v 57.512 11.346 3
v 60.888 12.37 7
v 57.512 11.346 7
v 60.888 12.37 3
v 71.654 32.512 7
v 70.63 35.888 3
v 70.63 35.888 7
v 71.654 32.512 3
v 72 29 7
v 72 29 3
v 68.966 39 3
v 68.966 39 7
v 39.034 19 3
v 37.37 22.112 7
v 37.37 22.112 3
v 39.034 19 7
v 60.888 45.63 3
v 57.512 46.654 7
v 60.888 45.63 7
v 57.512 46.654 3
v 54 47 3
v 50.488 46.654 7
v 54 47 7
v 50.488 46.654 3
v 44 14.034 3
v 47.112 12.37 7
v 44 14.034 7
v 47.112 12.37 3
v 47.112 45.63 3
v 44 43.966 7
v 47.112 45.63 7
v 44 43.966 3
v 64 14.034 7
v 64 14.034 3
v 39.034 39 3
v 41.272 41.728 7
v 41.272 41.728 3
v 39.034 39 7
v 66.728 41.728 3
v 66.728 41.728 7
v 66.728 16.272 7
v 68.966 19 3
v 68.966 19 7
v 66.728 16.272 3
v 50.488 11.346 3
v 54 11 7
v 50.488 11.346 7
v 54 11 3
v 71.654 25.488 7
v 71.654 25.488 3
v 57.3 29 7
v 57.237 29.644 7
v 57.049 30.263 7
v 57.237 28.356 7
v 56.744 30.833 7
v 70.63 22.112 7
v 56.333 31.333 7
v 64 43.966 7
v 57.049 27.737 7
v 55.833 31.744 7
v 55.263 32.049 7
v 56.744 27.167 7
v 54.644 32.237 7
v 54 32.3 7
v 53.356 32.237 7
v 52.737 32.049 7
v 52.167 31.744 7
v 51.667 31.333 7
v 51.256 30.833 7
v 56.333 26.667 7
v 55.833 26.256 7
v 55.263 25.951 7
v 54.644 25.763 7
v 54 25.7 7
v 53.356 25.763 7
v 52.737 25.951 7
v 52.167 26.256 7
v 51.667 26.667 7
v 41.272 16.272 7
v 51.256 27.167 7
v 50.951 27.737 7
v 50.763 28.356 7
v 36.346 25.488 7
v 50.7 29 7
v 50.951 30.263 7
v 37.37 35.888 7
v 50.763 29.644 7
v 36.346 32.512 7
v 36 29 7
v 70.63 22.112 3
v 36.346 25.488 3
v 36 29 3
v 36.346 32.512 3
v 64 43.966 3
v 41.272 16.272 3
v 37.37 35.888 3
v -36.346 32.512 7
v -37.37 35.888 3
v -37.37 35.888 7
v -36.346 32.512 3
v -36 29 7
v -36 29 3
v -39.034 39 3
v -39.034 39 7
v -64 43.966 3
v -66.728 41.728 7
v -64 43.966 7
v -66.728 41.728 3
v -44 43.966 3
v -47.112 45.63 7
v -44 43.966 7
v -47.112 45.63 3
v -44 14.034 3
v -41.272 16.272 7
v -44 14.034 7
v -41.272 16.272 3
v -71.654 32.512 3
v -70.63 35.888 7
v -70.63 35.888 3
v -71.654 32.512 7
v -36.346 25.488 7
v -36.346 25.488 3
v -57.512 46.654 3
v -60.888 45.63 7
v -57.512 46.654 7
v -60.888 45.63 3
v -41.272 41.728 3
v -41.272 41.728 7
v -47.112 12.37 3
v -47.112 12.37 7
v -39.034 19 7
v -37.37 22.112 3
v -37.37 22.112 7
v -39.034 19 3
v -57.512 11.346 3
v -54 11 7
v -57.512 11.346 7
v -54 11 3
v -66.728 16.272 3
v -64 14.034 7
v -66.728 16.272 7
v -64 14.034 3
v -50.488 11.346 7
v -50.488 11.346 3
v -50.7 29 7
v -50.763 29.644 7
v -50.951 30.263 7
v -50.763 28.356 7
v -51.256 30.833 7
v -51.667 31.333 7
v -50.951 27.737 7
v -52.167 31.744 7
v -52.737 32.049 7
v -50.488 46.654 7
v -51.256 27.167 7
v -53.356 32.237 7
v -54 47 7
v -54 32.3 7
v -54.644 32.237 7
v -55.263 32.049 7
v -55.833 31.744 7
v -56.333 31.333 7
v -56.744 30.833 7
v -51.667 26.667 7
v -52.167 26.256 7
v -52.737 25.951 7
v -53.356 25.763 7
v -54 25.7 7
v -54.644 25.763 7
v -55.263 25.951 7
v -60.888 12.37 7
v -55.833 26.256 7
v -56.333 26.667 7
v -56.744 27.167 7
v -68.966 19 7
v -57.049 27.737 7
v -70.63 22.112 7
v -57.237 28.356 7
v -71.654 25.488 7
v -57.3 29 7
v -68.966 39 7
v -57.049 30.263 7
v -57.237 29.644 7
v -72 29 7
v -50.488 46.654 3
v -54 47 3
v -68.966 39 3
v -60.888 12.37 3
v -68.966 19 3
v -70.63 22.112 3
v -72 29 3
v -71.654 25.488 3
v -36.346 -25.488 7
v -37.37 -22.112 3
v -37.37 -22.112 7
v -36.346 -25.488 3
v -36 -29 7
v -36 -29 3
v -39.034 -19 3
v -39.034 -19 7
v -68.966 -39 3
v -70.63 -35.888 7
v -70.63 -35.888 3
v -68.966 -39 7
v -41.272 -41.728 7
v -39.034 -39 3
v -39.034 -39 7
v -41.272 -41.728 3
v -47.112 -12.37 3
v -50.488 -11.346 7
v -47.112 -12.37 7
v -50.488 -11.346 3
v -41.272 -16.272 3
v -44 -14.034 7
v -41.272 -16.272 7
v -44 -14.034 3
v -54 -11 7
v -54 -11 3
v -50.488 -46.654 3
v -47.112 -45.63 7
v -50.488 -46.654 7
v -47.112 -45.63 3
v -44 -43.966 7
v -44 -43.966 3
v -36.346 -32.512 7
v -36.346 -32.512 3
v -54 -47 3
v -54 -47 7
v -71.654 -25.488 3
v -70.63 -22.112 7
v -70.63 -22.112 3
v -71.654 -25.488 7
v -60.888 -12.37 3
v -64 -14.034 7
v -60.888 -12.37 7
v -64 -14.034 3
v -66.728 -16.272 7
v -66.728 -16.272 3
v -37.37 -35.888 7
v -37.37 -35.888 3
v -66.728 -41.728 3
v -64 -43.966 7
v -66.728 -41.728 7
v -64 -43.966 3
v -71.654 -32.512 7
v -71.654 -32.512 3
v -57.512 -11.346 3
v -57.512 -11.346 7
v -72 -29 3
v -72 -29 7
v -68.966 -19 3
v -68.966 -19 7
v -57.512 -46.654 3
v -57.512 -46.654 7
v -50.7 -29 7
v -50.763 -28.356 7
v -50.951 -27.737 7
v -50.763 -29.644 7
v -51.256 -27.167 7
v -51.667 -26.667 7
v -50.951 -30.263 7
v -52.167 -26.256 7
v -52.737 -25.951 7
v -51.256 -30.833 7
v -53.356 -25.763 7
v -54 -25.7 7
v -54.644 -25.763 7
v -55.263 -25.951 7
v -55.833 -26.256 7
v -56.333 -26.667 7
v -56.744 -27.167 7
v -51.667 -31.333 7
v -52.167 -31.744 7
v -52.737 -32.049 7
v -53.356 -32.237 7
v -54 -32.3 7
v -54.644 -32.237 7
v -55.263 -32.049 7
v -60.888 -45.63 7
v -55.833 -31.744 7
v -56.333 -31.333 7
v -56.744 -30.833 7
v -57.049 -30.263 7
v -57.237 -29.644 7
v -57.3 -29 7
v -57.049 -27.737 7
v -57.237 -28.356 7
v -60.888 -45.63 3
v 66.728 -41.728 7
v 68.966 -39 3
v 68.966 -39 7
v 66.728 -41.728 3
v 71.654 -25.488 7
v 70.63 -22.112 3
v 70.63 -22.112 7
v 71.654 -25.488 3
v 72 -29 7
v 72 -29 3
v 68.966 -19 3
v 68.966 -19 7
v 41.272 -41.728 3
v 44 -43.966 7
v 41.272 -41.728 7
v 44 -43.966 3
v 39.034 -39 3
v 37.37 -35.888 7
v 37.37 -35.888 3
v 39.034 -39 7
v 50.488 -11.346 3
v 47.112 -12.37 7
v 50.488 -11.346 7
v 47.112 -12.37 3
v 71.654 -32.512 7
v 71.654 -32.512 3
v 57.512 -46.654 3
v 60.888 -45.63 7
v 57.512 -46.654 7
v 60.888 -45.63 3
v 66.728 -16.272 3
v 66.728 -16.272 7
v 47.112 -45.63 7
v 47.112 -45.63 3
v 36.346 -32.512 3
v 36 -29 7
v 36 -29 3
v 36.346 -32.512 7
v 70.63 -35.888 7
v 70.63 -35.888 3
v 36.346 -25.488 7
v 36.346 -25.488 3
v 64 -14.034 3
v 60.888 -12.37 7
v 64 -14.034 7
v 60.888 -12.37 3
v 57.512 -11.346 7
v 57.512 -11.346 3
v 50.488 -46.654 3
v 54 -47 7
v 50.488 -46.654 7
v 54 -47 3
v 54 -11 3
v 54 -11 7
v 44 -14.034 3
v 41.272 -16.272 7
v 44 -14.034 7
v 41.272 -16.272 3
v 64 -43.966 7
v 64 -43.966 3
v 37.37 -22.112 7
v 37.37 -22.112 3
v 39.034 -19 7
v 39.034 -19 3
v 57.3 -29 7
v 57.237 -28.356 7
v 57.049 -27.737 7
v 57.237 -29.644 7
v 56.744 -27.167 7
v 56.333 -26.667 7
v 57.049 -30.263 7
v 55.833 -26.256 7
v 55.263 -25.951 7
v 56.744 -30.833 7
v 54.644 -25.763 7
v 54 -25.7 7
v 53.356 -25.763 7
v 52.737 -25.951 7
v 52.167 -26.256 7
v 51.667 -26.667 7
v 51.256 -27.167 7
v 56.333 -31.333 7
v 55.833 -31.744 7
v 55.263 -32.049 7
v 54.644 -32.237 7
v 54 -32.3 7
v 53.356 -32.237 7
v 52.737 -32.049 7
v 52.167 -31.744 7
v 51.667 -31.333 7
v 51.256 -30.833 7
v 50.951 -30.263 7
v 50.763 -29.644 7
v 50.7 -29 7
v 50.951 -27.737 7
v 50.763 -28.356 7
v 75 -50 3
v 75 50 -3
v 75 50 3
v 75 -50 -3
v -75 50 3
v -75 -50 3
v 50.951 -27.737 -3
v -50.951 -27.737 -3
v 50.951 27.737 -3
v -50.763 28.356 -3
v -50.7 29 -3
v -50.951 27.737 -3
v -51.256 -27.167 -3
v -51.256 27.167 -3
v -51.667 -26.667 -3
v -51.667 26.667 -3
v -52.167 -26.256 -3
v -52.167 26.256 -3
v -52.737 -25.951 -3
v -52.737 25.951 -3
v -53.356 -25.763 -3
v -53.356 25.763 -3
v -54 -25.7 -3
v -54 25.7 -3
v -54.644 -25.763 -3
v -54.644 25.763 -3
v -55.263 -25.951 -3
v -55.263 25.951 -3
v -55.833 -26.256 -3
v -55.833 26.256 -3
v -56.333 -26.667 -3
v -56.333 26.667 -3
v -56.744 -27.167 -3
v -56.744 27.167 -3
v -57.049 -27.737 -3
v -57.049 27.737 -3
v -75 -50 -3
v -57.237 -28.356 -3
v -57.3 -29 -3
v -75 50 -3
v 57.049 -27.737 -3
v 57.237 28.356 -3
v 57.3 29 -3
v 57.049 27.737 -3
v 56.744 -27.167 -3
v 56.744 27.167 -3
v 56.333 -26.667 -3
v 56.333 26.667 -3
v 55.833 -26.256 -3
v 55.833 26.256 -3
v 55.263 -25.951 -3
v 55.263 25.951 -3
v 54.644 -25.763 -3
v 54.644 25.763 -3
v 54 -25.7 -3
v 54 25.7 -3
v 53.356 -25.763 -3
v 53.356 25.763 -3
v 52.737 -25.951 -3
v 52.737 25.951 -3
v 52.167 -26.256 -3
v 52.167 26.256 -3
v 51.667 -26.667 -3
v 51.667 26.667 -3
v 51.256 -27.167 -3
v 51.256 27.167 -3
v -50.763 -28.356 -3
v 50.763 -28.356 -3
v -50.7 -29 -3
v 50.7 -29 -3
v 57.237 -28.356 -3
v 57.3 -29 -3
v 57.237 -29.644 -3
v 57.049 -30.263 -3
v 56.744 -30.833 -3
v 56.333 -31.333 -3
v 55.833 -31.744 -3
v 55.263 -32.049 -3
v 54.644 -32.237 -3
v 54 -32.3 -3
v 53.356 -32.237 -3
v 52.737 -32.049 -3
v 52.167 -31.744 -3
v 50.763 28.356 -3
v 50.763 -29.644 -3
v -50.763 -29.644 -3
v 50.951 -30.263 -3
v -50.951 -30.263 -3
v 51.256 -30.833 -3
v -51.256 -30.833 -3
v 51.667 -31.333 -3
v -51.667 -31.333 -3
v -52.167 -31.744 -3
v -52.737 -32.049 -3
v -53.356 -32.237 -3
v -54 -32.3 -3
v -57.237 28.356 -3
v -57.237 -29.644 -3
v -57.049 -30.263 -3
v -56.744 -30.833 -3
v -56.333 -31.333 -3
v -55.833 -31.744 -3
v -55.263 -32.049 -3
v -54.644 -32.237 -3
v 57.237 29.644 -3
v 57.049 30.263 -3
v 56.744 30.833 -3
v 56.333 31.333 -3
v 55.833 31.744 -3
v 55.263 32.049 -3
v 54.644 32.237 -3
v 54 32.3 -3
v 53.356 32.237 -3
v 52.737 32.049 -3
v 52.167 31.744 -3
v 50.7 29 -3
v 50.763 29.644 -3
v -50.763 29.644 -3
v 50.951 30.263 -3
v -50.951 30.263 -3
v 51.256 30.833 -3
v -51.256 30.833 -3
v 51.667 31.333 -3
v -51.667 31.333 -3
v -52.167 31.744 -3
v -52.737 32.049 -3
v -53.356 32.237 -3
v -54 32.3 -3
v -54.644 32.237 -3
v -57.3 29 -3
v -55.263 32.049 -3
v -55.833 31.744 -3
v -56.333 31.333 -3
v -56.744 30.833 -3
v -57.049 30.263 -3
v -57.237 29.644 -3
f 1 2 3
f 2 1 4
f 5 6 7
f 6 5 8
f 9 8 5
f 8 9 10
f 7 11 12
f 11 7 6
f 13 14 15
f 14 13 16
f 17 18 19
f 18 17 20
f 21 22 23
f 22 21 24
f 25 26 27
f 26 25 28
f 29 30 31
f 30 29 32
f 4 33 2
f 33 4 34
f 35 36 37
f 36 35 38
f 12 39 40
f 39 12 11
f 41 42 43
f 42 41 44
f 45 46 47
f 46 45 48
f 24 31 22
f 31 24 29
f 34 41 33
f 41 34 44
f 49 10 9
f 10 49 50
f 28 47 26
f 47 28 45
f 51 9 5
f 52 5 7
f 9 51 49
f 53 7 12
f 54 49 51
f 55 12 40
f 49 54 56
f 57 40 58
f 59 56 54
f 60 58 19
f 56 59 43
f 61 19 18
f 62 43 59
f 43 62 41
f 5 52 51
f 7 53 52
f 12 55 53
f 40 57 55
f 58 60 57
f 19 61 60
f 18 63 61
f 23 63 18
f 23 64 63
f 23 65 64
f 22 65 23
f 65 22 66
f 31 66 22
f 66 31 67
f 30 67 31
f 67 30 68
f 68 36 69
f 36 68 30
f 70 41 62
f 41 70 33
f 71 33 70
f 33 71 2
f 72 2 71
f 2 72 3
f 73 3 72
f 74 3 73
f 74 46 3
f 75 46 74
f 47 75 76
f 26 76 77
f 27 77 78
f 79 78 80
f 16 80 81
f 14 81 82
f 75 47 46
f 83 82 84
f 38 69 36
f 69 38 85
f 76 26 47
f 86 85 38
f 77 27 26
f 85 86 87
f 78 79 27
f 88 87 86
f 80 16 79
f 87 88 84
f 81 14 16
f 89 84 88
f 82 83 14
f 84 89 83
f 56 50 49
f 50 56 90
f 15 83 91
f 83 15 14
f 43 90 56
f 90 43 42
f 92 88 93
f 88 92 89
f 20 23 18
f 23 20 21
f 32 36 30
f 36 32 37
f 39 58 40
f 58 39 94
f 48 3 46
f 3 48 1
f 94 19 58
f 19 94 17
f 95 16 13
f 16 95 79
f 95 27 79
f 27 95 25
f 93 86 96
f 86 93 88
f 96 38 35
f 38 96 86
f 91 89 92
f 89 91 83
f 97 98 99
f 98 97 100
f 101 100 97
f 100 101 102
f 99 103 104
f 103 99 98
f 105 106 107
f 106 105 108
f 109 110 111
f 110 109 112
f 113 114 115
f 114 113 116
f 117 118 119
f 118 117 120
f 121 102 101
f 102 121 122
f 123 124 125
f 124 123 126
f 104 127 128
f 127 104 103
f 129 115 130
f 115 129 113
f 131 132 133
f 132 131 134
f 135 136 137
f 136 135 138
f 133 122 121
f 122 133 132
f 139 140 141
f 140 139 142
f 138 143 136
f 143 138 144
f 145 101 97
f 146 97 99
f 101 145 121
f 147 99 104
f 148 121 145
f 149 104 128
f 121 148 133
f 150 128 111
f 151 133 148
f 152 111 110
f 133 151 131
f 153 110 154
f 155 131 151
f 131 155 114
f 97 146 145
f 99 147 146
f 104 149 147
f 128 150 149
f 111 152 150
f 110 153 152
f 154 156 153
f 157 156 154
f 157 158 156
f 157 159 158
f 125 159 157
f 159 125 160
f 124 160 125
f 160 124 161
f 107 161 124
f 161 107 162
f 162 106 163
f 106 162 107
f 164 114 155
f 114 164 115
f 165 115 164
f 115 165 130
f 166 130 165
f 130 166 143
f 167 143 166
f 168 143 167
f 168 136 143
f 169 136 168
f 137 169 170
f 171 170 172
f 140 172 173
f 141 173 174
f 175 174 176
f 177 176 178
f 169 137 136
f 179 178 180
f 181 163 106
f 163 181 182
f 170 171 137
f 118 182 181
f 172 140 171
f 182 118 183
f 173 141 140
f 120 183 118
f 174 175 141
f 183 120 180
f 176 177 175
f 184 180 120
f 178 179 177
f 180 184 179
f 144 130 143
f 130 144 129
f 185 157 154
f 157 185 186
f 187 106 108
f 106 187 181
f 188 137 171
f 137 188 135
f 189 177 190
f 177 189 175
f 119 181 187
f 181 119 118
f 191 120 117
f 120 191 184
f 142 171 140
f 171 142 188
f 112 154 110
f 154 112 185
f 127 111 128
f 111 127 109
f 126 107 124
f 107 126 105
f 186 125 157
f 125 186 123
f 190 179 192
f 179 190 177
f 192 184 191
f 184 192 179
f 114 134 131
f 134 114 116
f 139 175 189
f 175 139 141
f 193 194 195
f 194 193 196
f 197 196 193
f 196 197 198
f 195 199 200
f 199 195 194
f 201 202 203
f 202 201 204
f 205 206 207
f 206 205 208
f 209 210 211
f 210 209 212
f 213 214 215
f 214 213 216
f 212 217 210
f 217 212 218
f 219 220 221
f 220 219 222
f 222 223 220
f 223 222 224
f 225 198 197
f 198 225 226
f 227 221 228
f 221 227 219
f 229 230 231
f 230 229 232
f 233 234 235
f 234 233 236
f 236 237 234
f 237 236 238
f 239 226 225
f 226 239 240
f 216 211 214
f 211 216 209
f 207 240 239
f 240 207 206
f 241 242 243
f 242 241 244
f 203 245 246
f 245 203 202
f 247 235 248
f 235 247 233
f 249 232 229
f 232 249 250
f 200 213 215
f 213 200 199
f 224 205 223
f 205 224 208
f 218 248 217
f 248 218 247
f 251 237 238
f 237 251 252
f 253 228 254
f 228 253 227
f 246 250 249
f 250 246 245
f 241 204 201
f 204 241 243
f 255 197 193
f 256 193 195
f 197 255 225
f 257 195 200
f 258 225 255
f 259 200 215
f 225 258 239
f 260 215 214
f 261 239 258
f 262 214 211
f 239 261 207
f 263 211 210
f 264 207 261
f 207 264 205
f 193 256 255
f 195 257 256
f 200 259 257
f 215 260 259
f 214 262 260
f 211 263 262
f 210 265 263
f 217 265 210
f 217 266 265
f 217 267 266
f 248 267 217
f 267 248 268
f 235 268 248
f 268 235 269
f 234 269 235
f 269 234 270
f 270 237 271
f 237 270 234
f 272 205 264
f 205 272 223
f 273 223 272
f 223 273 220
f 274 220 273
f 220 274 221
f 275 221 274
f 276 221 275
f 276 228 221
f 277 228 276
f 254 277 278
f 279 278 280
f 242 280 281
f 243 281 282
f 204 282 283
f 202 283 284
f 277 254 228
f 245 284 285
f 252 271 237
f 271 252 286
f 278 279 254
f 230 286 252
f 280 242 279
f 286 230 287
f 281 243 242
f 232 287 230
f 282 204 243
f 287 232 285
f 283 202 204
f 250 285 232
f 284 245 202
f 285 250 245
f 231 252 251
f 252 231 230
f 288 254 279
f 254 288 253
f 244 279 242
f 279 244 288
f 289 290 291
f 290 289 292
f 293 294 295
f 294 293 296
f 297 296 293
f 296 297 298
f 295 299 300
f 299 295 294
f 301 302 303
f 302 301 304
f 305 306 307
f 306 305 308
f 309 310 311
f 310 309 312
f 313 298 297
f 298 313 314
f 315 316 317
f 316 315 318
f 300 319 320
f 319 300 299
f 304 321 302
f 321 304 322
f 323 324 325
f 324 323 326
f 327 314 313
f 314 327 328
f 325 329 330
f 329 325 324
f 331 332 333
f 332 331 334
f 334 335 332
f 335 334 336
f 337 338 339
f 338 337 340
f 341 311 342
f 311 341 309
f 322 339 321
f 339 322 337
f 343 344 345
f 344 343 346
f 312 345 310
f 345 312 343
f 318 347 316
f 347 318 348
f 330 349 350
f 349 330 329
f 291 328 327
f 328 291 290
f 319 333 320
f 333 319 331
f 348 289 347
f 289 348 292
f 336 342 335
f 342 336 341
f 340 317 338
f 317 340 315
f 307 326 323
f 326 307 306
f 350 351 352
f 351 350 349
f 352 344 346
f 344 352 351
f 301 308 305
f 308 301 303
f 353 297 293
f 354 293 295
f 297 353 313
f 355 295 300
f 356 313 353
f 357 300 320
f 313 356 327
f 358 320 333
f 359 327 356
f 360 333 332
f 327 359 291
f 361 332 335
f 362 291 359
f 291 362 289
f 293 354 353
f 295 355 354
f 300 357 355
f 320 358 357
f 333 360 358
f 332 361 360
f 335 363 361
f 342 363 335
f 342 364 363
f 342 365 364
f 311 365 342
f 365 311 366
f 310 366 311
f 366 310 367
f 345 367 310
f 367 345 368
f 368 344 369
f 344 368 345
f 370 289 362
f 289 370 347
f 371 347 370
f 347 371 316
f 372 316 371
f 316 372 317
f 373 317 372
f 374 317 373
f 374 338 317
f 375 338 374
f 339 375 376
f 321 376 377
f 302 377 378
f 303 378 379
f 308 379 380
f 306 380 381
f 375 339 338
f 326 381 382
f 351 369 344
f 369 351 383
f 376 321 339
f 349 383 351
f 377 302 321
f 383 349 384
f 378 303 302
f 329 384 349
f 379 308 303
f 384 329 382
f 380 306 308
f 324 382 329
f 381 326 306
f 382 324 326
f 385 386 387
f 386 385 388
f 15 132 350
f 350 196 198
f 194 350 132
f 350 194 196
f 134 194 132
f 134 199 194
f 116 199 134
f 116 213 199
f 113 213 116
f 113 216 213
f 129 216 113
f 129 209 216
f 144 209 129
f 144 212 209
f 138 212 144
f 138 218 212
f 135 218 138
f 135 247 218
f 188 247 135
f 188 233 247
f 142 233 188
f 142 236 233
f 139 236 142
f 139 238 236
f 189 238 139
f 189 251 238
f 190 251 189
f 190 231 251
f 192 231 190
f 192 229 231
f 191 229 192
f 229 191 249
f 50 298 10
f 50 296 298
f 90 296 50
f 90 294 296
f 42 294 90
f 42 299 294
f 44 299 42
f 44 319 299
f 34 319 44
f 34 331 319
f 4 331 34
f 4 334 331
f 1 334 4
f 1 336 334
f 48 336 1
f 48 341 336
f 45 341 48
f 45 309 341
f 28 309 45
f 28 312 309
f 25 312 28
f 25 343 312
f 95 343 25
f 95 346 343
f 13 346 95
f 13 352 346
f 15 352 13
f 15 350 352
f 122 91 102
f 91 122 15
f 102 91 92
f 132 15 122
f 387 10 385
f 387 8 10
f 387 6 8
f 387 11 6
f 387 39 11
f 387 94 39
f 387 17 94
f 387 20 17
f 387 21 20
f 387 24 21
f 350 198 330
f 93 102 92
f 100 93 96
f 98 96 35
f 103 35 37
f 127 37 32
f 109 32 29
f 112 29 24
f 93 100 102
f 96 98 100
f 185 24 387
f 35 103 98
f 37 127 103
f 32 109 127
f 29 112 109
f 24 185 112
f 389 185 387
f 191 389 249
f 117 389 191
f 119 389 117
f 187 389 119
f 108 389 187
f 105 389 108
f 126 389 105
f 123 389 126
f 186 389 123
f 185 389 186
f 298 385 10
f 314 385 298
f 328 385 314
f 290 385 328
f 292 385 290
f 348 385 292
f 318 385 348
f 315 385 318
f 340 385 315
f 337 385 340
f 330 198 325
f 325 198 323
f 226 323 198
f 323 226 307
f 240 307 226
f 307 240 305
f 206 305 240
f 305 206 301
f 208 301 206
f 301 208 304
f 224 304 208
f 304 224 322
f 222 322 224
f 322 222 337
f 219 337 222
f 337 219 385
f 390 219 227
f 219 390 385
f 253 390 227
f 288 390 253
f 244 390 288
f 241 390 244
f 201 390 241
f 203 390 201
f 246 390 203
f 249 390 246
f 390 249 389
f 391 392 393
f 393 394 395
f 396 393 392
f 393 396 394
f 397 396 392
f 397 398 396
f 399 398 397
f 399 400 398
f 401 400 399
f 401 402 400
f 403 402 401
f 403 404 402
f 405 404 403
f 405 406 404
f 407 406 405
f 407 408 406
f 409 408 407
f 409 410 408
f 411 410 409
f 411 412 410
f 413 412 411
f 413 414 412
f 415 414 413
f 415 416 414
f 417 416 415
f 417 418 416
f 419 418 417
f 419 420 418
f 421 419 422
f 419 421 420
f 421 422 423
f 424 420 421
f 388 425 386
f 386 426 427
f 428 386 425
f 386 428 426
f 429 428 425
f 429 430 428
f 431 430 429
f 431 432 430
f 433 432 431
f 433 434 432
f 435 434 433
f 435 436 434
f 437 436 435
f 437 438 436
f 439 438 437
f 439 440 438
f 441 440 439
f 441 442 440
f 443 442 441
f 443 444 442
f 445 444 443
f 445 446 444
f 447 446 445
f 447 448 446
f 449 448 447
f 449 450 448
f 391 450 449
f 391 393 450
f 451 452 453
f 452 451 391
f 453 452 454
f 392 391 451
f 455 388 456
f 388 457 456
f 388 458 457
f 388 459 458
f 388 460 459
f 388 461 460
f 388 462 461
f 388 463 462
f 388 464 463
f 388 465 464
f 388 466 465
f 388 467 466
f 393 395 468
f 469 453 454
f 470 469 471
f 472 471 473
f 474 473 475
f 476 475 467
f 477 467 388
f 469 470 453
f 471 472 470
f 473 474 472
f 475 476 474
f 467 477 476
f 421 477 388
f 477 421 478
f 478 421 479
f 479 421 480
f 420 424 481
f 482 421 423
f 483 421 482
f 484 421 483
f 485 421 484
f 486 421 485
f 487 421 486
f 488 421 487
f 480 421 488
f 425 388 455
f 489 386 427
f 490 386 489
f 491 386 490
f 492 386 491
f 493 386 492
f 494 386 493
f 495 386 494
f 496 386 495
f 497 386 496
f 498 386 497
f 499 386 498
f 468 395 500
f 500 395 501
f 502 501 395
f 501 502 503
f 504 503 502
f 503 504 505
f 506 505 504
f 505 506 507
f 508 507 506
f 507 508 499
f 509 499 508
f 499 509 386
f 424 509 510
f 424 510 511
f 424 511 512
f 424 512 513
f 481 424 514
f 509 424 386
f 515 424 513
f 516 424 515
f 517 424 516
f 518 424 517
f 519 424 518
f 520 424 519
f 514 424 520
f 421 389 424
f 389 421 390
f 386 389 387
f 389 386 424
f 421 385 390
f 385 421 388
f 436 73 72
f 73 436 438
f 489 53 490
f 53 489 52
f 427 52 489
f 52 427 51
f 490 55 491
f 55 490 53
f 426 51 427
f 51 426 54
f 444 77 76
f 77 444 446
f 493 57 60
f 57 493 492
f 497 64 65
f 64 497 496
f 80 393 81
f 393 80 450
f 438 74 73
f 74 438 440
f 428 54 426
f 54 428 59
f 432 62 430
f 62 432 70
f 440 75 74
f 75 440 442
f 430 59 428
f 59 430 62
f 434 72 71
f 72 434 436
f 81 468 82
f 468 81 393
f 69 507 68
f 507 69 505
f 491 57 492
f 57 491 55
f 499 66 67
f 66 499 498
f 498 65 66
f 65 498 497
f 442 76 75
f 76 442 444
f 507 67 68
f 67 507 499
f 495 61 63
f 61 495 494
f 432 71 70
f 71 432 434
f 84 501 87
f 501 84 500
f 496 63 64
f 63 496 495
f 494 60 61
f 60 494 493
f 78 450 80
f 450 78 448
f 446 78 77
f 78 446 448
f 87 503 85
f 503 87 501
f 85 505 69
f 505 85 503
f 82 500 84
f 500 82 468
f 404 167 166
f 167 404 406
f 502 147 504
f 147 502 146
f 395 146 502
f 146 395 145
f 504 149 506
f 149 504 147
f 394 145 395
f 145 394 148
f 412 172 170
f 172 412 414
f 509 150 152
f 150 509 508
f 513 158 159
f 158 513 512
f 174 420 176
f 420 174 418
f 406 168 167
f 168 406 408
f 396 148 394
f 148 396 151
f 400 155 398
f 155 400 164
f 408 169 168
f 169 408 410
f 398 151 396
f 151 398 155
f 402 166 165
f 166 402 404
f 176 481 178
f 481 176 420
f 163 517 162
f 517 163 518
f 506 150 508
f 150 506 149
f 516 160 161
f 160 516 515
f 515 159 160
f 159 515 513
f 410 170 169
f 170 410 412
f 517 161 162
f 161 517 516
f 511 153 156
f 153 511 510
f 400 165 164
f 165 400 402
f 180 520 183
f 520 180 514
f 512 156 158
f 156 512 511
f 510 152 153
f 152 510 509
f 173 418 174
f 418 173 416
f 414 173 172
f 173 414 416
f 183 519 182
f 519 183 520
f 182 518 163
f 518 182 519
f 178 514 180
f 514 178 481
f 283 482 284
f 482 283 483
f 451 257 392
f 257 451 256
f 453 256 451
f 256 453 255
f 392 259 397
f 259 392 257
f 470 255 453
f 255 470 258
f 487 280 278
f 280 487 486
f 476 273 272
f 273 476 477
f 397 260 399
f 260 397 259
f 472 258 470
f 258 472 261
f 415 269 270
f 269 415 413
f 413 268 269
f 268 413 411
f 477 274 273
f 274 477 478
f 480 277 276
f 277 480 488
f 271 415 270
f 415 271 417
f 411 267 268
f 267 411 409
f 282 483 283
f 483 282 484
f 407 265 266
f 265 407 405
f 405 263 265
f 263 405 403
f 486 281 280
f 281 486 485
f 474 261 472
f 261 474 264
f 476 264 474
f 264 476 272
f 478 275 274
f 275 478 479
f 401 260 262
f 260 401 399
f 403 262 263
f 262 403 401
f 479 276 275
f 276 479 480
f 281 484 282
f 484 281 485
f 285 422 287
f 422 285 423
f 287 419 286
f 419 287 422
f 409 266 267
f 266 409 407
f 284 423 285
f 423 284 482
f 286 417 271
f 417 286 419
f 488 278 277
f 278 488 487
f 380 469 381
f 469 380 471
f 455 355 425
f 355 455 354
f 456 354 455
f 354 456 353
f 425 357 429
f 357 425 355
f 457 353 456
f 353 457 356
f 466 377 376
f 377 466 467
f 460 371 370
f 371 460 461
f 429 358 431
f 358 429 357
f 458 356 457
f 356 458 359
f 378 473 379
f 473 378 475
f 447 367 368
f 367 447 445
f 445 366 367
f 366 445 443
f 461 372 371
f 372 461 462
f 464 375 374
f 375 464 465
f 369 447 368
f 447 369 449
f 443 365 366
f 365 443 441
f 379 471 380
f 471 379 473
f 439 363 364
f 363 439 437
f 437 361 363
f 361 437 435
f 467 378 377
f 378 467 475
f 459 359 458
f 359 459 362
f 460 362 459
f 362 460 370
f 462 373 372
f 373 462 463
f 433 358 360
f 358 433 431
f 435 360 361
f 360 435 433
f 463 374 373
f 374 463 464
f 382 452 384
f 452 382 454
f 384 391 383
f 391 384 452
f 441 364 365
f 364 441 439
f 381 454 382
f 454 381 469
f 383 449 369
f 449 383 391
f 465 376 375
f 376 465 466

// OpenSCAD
$fn = 32;

// ----------------------------------------------------------------------
// Anchor pads 150 x 100 x 10
// four corner bosses with anchor holes
// ----------------------------------------------------------------------

// --- parameters (mm) ---
plate = [150, 100, 6];  // base plate size (x, y, z)
pads = 4;               // boss count, one per corner
edge = 21;              // boss centre offset from the plate edge
boss_d = 36;            // boss diameter
boss_h = 4;             // boss height above the base plate
hole_d = 6.6;           // hole diameter

// --- derived feature positions (mm) ---
height = plate[2] + boss_h;      // = 10   overall height of the part
corner_x = plate[0] / 2 - edge;  // = 54   boss centre X
corner_y = plate[1] / 2 - edge;  // = 29   boss centre Y
feature_centers = [
  [corner_x, corner_y],
  [-corner_x, corner_y],
  [-corner_x, -corner_y],
  [corner_x, -corner_y]
];   // boss centres, anchor holes are drilled there

// base plate, four bosses standing on it, anchor holes all the way through
difference() {
  union() {
    cube(plate, center = true);
    for (centre = feature_centers)
      translate([centre[0], centre[1], plate[2] / 2 - 1])
        cylinder(d = boss_d, h = boss_h + 1);
  }
  for (centre = feature_centers)
    translate([centre[0], centre[1], -height])
      cylinder(d = hole_d, h = 2 * height + 2);  // through boss and plate
}
